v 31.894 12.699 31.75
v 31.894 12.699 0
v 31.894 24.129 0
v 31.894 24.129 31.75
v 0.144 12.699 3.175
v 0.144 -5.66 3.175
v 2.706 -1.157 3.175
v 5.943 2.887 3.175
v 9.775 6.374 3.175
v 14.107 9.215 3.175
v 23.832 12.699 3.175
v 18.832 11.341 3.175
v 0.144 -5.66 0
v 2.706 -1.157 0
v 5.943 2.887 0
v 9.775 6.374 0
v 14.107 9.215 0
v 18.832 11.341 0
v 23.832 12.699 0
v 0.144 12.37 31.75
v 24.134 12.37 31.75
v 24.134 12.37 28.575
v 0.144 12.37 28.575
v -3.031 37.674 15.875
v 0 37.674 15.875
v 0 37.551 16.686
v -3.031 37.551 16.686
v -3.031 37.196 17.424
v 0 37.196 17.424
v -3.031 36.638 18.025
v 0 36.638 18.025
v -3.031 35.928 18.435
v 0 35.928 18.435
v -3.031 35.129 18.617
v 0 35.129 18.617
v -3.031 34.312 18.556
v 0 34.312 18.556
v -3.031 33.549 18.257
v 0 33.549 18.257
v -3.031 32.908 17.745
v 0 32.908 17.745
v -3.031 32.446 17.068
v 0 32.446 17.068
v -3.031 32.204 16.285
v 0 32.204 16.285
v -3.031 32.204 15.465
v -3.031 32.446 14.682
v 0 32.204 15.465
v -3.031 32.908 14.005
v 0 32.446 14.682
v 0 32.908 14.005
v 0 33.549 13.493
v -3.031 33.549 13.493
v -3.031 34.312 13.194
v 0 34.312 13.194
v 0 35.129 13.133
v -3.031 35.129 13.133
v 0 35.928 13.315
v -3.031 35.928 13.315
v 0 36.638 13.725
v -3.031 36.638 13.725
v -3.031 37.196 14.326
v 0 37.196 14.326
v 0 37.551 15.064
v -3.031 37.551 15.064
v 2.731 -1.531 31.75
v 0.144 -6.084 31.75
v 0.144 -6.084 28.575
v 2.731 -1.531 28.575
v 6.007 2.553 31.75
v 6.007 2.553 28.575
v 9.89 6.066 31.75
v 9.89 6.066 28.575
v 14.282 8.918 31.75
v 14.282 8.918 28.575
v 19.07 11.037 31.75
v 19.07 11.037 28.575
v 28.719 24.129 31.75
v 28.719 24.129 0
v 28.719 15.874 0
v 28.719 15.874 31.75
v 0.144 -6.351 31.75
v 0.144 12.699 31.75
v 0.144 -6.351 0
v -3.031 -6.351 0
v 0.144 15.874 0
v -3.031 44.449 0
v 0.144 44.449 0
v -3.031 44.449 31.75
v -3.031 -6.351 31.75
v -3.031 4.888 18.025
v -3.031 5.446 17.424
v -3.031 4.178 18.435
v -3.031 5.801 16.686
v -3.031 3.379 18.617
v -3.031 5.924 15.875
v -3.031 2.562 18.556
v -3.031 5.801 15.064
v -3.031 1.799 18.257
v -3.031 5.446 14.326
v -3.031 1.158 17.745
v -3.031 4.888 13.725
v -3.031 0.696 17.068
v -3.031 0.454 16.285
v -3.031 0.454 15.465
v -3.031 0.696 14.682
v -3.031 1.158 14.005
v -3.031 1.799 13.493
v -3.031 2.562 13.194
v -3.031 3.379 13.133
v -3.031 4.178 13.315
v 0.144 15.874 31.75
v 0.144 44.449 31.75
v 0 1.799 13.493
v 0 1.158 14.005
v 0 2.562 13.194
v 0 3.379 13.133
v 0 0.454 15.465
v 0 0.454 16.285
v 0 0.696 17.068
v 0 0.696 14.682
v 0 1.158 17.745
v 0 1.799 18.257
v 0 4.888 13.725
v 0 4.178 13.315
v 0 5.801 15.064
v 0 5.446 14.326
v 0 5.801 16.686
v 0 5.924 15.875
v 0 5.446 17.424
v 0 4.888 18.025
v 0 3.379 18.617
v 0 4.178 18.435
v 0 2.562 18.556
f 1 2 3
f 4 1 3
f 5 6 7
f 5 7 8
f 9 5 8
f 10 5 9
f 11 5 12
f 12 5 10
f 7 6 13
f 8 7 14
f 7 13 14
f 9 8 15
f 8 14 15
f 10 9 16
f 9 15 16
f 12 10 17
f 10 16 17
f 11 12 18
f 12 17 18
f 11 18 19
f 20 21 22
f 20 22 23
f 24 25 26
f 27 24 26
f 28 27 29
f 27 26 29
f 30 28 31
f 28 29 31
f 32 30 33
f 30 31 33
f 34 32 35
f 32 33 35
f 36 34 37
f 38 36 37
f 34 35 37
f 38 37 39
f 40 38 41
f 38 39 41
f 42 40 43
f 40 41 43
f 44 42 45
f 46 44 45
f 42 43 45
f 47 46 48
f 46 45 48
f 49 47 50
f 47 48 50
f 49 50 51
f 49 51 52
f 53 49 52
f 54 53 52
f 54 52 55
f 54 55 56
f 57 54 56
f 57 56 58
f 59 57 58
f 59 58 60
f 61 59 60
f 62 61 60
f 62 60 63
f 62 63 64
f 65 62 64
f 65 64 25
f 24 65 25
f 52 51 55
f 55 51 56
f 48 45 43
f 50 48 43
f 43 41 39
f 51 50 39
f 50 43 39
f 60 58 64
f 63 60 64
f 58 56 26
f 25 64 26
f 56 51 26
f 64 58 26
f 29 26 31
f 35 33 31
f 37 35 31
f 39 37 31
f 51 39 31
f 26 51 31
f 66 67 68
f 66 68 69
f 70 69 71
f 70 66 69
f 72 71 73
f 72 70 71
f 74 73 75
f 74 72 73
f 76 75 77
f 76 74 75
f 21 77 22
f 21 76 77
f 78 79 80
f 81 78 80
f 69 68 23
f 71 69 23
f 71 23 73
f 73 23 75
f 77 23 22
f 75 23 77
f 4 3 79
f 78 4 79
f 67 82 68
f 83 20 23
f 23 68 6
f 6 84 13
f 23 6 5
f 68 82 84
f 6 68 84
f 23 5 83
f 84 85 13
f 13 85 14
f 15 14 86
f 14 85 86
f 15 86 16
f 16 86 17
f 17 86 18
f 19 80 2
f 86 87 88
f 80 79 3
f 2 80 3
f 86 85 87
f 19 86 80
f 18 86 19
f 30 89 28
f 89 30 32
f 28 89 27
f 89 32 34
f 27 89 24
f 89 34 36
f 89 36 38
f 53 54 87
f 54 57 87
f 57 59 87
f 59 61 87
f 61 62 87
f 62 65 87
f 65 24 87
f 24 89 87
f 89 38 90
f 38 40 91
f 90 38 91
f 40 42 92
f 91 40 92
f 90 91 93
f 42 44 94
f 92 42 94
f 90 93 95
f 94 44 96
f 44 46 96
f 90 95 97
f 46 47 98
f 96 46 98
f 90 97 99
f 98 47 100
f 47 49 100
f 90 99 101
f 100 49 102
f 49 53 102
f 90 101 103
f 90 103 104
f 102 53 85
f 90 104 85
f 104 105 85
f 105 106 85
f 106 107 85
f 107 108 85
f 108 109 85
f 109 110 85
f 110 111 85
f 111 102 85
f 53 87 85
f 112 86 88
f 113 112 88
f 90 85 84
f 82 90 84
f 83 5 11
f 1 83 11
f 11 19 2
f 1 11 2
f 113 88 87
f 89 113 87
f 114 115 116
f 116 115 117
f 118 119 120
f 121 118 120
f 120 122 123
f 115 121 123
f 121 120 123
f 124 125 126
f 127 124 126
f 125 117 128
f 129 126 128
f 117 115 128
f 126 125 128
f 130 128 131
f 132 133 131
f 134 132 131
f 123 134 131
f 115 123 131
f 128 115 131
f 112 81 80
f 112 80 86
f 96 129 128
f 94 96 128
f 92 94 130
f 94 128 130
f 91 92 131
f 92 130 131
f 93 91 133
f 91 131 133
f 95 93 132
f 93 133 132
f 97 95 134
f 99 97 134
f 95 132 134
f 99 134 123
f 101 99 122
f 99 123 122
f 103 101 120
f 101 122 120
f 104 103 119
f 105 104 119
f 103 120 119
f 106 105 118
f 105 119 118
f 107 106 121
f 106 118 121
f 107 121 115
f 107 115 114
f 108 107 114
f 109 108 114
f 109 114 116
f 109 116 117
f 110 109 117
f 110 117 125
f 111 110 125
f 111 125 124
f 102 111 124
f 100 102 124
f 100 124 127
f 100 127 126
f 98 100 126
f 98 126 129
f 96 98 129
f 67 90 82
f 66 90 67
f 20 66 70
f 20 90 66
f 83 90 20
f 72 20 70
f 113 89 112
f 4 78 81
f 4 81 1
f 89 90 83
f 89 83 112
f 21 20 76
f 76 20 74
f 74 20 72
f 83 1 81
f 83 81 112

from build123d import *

# Parameters (mm, degrees)
F1_DEPTH = 31.75
F3_DEPTH = 3.175
F5_DEPTH = 3.175
F7_D     = 5.5
F7_DEPTH = 3.0323066673


with BuildPart() as f1:
    # F0 (on Top) → F1 (new body)
    with BuildSketch(Plane.XY):
        Polygon((0.1436933327, 44.4485164799), (-3.0313066673, 44.4485164799), (-3.0313066673, -6.3514835201), (0.1436933327, -6.3514835201), (0.1436933327, 12.6985164799), (31.8936933327, 12.6985164799), (31.8936933327, 24.1285164799), (28.7186933327, 24.1285164799), (28.7186933327, 15.8735164799), (0.1436933327, 15.8735164799), align=None)
    extrude(amount=F1_DEPTH)

    # F2 (on Top) → F3 (join)
    with BuildSketch(Plane.XY):
        with BuildLine():
            ThreePointArc((0, -5.9709572233), (9.7535685251, 6.3565785033), (24.1138786077, 12.7504607663))
            Line((24.1138786077, 12.7504607663), (0, 12.7504607663))
            Line((0, 12.7504607663), (0, -5.9709572233))
        make_face()
    extrude(amount=F3_DEPTH)

    # F4 (on face) → F5 (join)
    with BuildSketch(Plane.XY.offset(31.75)):
        with BuildLine():
            ThreePointArc((0.1436933327, -6.0840700046), (9.8903219557, 6.066105621), (24.1341023211, 12.3699344695))
            Line((24.1341023211, 12.3699344695), (0.1436933327, 12.3699344695))
            Line((0.1436933327, 12.3699344695), (0.1436933327, -6.0840700046))
        make_face()
    extrude(amount=-F5_DEPTH)

    # F7 (through all, one way)
    with BuildSketch(Plane.YZ):
        with Locations((3.1735164799, 15.875), (34.9235164799, 15.875)):
            Circle(F7_D / 2)
    extrude(amount=-F7_DEPTH, mode=Mode.SUBTRACT)


solid = f1.part
